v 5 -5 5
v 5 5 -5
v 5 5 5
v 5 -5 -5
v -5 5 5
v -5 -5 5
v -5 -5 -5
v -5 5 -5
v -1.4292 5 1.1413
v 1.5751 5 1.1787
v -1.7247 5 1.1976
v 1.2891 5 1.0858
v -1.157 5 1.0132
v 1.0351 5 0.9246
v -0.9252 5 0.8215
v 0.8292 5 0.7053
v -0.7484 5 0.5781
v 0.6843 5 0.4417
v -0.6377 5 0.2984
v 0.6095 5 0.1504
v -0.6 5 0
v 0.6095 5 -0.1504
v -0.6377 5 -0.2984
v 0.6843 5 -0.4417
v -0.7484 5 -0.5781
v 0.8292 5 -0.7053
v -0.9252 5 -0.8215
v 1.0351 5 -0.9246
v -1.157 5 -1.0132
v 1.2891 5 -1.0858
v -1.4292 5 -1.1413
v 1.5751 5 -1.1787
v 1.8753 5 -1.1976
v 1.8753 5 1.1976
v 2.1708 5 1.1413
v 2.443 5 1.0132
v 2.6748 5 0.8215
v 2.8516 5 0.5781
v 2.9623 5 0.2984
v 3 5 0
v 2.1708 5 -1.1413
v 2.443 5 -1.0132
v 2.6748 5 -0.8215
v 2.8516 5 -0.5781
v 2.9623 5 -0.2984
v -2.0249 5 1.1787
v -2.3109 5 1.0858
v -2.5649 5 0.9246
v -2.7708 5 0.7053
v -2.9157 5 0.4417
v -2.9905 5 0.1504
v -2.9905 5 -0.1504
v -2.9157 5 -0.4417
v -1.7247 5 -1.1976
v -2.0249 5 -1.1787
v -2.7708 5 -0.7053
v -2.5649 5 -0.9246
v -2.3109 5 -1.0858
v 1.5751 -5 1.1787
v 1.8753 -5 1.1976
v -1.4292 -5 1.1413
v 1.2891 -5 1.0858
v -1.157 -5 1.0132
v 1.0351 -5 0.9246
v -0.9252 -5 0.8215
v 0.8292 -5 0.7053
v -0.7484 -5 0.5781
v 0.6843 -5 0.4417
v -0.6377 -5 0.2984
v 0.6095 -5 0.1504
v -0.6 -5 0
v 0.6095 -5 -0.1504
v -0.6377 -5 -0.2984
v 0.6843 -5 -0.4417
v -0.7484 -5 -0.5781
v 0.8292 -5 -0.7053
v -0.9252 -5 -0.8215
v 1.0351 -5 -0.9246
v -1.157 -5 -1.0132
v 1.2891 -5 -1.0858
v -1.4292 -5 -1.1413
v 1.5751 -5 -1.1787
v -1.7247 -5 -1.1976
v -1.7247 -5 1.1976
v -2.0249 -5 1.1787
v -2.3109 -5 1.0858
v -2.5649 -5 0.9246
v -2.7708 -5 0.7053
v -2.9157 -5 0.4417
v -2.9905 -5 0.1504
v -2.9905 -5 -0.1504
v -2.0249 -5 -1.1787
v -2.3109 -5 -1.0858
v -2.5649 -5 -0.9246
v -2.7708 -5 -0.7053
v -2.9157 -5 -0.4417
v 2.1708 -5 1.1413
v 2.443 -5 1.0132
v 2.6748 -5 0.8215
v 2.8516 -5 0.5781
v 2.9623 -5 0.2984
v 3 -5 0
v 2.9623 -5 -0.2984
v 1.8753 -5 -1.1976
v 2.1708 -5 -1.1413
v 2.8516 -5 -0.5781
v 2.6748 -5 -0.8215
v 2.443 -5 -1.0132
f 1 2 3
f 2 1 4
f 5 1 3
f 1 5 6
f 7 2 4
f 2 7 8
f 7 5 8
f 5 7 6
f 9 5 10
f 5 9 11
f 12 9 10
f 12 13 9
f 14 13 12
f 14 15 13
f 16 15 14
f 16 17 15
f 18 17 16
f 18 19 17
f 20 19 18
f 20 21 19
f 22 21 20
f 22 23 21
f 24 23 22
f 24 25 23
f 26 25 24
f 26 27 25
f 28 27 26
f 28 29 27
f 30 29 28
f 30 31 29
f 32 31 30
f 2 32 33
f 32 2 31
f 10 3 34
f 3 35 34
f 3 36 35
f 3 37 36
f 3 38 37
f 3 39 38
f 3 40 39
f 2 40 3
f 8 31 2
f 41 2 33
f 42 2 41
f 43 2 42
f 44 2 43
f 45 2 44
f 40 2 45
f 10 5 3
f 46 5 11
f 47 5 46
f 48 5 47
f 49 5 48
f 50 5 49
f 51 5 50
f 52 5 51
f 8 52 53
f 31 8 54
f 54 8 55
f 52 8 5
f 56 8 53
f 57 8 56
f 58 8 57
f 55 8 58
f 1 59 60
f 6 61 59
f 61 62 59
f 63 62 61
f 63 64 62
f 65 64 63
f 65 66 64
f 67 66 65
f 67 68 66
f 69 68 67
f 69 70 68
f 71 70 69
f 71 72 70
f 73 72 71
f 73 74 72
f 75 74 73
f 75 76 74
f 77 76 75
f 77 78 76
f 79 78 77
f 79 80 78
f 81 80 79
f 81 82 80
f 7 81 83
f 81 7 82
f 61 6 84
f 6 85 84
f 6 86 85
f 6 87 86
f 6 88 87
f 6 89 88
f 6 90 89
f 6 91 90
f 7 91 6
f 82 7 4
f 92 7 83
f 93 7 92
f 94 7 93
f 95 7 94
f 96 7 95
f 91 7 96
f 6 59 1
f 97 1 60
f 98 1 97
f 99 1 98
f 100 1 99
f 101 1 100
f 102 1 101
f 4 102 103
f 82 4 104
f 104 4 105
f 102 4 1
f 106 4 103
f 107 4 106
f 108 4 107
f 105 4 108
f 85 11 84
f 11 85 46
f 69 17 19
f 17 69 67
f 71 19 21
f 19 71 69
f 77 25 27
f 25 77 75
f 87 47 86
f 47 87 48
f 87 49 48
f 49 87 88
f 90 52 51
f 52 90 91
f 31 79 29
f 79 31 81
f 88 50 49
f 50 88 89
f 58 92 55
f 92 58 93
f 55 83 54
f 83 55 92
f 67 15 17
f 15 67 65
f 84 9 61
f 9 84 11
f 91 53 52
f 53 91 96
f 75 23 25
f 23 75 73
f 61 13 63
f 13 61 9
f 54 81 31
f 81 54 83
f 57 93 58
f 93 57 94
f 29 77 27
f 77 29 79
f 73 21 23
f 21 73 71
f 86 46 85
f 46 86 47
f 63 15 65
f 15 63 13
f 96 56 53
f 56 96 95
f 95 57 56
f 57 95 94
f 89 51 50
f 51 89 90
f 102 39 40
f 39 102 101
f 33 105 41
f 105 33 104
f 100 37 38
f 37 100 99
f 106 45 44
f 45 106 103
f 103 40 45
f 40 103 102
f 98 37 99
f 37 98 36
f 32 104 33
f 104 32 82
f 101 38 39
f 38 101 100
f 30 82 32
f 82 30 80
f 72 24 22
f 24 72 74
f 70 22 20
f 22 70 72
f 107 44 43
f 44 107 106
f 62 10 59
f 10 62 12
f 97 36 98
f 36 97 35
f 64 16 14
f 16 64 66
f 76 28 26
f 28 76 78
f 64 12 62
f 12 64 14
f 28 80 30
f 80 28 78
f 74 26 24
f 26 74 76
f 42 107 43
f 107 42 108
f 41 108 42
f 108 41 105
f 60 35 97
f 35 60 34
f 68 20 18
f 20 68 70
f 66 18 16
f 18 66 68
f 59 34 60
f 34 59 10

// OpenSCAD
//*********************************************//
//IMPORTANT//
sensorHoleSize = 2.3 + 0.1;
$fn = 25;
//IF PRINTING $fn = 25;//
//IF ETHAN, sensorHoleSize = 2.3 + 0.1;//
//ELSE, sensorHoleSize = 2.3;//
//*********************************************//

difference()
{
    cube([10, 10, 10], center = true);
    translate ([-1.8, 0, 0]) 
    {
        rotate([90,0,0])
        {
            cylinder(10,d = sensorHoleSize,center = true);
        }
    }
    translate ([1.8, 0, 0]) 
    {
        rotate([90,0,0])
        {
            cylinder(10,d = sensorHoleSize,center = true);
        }
    }
}
